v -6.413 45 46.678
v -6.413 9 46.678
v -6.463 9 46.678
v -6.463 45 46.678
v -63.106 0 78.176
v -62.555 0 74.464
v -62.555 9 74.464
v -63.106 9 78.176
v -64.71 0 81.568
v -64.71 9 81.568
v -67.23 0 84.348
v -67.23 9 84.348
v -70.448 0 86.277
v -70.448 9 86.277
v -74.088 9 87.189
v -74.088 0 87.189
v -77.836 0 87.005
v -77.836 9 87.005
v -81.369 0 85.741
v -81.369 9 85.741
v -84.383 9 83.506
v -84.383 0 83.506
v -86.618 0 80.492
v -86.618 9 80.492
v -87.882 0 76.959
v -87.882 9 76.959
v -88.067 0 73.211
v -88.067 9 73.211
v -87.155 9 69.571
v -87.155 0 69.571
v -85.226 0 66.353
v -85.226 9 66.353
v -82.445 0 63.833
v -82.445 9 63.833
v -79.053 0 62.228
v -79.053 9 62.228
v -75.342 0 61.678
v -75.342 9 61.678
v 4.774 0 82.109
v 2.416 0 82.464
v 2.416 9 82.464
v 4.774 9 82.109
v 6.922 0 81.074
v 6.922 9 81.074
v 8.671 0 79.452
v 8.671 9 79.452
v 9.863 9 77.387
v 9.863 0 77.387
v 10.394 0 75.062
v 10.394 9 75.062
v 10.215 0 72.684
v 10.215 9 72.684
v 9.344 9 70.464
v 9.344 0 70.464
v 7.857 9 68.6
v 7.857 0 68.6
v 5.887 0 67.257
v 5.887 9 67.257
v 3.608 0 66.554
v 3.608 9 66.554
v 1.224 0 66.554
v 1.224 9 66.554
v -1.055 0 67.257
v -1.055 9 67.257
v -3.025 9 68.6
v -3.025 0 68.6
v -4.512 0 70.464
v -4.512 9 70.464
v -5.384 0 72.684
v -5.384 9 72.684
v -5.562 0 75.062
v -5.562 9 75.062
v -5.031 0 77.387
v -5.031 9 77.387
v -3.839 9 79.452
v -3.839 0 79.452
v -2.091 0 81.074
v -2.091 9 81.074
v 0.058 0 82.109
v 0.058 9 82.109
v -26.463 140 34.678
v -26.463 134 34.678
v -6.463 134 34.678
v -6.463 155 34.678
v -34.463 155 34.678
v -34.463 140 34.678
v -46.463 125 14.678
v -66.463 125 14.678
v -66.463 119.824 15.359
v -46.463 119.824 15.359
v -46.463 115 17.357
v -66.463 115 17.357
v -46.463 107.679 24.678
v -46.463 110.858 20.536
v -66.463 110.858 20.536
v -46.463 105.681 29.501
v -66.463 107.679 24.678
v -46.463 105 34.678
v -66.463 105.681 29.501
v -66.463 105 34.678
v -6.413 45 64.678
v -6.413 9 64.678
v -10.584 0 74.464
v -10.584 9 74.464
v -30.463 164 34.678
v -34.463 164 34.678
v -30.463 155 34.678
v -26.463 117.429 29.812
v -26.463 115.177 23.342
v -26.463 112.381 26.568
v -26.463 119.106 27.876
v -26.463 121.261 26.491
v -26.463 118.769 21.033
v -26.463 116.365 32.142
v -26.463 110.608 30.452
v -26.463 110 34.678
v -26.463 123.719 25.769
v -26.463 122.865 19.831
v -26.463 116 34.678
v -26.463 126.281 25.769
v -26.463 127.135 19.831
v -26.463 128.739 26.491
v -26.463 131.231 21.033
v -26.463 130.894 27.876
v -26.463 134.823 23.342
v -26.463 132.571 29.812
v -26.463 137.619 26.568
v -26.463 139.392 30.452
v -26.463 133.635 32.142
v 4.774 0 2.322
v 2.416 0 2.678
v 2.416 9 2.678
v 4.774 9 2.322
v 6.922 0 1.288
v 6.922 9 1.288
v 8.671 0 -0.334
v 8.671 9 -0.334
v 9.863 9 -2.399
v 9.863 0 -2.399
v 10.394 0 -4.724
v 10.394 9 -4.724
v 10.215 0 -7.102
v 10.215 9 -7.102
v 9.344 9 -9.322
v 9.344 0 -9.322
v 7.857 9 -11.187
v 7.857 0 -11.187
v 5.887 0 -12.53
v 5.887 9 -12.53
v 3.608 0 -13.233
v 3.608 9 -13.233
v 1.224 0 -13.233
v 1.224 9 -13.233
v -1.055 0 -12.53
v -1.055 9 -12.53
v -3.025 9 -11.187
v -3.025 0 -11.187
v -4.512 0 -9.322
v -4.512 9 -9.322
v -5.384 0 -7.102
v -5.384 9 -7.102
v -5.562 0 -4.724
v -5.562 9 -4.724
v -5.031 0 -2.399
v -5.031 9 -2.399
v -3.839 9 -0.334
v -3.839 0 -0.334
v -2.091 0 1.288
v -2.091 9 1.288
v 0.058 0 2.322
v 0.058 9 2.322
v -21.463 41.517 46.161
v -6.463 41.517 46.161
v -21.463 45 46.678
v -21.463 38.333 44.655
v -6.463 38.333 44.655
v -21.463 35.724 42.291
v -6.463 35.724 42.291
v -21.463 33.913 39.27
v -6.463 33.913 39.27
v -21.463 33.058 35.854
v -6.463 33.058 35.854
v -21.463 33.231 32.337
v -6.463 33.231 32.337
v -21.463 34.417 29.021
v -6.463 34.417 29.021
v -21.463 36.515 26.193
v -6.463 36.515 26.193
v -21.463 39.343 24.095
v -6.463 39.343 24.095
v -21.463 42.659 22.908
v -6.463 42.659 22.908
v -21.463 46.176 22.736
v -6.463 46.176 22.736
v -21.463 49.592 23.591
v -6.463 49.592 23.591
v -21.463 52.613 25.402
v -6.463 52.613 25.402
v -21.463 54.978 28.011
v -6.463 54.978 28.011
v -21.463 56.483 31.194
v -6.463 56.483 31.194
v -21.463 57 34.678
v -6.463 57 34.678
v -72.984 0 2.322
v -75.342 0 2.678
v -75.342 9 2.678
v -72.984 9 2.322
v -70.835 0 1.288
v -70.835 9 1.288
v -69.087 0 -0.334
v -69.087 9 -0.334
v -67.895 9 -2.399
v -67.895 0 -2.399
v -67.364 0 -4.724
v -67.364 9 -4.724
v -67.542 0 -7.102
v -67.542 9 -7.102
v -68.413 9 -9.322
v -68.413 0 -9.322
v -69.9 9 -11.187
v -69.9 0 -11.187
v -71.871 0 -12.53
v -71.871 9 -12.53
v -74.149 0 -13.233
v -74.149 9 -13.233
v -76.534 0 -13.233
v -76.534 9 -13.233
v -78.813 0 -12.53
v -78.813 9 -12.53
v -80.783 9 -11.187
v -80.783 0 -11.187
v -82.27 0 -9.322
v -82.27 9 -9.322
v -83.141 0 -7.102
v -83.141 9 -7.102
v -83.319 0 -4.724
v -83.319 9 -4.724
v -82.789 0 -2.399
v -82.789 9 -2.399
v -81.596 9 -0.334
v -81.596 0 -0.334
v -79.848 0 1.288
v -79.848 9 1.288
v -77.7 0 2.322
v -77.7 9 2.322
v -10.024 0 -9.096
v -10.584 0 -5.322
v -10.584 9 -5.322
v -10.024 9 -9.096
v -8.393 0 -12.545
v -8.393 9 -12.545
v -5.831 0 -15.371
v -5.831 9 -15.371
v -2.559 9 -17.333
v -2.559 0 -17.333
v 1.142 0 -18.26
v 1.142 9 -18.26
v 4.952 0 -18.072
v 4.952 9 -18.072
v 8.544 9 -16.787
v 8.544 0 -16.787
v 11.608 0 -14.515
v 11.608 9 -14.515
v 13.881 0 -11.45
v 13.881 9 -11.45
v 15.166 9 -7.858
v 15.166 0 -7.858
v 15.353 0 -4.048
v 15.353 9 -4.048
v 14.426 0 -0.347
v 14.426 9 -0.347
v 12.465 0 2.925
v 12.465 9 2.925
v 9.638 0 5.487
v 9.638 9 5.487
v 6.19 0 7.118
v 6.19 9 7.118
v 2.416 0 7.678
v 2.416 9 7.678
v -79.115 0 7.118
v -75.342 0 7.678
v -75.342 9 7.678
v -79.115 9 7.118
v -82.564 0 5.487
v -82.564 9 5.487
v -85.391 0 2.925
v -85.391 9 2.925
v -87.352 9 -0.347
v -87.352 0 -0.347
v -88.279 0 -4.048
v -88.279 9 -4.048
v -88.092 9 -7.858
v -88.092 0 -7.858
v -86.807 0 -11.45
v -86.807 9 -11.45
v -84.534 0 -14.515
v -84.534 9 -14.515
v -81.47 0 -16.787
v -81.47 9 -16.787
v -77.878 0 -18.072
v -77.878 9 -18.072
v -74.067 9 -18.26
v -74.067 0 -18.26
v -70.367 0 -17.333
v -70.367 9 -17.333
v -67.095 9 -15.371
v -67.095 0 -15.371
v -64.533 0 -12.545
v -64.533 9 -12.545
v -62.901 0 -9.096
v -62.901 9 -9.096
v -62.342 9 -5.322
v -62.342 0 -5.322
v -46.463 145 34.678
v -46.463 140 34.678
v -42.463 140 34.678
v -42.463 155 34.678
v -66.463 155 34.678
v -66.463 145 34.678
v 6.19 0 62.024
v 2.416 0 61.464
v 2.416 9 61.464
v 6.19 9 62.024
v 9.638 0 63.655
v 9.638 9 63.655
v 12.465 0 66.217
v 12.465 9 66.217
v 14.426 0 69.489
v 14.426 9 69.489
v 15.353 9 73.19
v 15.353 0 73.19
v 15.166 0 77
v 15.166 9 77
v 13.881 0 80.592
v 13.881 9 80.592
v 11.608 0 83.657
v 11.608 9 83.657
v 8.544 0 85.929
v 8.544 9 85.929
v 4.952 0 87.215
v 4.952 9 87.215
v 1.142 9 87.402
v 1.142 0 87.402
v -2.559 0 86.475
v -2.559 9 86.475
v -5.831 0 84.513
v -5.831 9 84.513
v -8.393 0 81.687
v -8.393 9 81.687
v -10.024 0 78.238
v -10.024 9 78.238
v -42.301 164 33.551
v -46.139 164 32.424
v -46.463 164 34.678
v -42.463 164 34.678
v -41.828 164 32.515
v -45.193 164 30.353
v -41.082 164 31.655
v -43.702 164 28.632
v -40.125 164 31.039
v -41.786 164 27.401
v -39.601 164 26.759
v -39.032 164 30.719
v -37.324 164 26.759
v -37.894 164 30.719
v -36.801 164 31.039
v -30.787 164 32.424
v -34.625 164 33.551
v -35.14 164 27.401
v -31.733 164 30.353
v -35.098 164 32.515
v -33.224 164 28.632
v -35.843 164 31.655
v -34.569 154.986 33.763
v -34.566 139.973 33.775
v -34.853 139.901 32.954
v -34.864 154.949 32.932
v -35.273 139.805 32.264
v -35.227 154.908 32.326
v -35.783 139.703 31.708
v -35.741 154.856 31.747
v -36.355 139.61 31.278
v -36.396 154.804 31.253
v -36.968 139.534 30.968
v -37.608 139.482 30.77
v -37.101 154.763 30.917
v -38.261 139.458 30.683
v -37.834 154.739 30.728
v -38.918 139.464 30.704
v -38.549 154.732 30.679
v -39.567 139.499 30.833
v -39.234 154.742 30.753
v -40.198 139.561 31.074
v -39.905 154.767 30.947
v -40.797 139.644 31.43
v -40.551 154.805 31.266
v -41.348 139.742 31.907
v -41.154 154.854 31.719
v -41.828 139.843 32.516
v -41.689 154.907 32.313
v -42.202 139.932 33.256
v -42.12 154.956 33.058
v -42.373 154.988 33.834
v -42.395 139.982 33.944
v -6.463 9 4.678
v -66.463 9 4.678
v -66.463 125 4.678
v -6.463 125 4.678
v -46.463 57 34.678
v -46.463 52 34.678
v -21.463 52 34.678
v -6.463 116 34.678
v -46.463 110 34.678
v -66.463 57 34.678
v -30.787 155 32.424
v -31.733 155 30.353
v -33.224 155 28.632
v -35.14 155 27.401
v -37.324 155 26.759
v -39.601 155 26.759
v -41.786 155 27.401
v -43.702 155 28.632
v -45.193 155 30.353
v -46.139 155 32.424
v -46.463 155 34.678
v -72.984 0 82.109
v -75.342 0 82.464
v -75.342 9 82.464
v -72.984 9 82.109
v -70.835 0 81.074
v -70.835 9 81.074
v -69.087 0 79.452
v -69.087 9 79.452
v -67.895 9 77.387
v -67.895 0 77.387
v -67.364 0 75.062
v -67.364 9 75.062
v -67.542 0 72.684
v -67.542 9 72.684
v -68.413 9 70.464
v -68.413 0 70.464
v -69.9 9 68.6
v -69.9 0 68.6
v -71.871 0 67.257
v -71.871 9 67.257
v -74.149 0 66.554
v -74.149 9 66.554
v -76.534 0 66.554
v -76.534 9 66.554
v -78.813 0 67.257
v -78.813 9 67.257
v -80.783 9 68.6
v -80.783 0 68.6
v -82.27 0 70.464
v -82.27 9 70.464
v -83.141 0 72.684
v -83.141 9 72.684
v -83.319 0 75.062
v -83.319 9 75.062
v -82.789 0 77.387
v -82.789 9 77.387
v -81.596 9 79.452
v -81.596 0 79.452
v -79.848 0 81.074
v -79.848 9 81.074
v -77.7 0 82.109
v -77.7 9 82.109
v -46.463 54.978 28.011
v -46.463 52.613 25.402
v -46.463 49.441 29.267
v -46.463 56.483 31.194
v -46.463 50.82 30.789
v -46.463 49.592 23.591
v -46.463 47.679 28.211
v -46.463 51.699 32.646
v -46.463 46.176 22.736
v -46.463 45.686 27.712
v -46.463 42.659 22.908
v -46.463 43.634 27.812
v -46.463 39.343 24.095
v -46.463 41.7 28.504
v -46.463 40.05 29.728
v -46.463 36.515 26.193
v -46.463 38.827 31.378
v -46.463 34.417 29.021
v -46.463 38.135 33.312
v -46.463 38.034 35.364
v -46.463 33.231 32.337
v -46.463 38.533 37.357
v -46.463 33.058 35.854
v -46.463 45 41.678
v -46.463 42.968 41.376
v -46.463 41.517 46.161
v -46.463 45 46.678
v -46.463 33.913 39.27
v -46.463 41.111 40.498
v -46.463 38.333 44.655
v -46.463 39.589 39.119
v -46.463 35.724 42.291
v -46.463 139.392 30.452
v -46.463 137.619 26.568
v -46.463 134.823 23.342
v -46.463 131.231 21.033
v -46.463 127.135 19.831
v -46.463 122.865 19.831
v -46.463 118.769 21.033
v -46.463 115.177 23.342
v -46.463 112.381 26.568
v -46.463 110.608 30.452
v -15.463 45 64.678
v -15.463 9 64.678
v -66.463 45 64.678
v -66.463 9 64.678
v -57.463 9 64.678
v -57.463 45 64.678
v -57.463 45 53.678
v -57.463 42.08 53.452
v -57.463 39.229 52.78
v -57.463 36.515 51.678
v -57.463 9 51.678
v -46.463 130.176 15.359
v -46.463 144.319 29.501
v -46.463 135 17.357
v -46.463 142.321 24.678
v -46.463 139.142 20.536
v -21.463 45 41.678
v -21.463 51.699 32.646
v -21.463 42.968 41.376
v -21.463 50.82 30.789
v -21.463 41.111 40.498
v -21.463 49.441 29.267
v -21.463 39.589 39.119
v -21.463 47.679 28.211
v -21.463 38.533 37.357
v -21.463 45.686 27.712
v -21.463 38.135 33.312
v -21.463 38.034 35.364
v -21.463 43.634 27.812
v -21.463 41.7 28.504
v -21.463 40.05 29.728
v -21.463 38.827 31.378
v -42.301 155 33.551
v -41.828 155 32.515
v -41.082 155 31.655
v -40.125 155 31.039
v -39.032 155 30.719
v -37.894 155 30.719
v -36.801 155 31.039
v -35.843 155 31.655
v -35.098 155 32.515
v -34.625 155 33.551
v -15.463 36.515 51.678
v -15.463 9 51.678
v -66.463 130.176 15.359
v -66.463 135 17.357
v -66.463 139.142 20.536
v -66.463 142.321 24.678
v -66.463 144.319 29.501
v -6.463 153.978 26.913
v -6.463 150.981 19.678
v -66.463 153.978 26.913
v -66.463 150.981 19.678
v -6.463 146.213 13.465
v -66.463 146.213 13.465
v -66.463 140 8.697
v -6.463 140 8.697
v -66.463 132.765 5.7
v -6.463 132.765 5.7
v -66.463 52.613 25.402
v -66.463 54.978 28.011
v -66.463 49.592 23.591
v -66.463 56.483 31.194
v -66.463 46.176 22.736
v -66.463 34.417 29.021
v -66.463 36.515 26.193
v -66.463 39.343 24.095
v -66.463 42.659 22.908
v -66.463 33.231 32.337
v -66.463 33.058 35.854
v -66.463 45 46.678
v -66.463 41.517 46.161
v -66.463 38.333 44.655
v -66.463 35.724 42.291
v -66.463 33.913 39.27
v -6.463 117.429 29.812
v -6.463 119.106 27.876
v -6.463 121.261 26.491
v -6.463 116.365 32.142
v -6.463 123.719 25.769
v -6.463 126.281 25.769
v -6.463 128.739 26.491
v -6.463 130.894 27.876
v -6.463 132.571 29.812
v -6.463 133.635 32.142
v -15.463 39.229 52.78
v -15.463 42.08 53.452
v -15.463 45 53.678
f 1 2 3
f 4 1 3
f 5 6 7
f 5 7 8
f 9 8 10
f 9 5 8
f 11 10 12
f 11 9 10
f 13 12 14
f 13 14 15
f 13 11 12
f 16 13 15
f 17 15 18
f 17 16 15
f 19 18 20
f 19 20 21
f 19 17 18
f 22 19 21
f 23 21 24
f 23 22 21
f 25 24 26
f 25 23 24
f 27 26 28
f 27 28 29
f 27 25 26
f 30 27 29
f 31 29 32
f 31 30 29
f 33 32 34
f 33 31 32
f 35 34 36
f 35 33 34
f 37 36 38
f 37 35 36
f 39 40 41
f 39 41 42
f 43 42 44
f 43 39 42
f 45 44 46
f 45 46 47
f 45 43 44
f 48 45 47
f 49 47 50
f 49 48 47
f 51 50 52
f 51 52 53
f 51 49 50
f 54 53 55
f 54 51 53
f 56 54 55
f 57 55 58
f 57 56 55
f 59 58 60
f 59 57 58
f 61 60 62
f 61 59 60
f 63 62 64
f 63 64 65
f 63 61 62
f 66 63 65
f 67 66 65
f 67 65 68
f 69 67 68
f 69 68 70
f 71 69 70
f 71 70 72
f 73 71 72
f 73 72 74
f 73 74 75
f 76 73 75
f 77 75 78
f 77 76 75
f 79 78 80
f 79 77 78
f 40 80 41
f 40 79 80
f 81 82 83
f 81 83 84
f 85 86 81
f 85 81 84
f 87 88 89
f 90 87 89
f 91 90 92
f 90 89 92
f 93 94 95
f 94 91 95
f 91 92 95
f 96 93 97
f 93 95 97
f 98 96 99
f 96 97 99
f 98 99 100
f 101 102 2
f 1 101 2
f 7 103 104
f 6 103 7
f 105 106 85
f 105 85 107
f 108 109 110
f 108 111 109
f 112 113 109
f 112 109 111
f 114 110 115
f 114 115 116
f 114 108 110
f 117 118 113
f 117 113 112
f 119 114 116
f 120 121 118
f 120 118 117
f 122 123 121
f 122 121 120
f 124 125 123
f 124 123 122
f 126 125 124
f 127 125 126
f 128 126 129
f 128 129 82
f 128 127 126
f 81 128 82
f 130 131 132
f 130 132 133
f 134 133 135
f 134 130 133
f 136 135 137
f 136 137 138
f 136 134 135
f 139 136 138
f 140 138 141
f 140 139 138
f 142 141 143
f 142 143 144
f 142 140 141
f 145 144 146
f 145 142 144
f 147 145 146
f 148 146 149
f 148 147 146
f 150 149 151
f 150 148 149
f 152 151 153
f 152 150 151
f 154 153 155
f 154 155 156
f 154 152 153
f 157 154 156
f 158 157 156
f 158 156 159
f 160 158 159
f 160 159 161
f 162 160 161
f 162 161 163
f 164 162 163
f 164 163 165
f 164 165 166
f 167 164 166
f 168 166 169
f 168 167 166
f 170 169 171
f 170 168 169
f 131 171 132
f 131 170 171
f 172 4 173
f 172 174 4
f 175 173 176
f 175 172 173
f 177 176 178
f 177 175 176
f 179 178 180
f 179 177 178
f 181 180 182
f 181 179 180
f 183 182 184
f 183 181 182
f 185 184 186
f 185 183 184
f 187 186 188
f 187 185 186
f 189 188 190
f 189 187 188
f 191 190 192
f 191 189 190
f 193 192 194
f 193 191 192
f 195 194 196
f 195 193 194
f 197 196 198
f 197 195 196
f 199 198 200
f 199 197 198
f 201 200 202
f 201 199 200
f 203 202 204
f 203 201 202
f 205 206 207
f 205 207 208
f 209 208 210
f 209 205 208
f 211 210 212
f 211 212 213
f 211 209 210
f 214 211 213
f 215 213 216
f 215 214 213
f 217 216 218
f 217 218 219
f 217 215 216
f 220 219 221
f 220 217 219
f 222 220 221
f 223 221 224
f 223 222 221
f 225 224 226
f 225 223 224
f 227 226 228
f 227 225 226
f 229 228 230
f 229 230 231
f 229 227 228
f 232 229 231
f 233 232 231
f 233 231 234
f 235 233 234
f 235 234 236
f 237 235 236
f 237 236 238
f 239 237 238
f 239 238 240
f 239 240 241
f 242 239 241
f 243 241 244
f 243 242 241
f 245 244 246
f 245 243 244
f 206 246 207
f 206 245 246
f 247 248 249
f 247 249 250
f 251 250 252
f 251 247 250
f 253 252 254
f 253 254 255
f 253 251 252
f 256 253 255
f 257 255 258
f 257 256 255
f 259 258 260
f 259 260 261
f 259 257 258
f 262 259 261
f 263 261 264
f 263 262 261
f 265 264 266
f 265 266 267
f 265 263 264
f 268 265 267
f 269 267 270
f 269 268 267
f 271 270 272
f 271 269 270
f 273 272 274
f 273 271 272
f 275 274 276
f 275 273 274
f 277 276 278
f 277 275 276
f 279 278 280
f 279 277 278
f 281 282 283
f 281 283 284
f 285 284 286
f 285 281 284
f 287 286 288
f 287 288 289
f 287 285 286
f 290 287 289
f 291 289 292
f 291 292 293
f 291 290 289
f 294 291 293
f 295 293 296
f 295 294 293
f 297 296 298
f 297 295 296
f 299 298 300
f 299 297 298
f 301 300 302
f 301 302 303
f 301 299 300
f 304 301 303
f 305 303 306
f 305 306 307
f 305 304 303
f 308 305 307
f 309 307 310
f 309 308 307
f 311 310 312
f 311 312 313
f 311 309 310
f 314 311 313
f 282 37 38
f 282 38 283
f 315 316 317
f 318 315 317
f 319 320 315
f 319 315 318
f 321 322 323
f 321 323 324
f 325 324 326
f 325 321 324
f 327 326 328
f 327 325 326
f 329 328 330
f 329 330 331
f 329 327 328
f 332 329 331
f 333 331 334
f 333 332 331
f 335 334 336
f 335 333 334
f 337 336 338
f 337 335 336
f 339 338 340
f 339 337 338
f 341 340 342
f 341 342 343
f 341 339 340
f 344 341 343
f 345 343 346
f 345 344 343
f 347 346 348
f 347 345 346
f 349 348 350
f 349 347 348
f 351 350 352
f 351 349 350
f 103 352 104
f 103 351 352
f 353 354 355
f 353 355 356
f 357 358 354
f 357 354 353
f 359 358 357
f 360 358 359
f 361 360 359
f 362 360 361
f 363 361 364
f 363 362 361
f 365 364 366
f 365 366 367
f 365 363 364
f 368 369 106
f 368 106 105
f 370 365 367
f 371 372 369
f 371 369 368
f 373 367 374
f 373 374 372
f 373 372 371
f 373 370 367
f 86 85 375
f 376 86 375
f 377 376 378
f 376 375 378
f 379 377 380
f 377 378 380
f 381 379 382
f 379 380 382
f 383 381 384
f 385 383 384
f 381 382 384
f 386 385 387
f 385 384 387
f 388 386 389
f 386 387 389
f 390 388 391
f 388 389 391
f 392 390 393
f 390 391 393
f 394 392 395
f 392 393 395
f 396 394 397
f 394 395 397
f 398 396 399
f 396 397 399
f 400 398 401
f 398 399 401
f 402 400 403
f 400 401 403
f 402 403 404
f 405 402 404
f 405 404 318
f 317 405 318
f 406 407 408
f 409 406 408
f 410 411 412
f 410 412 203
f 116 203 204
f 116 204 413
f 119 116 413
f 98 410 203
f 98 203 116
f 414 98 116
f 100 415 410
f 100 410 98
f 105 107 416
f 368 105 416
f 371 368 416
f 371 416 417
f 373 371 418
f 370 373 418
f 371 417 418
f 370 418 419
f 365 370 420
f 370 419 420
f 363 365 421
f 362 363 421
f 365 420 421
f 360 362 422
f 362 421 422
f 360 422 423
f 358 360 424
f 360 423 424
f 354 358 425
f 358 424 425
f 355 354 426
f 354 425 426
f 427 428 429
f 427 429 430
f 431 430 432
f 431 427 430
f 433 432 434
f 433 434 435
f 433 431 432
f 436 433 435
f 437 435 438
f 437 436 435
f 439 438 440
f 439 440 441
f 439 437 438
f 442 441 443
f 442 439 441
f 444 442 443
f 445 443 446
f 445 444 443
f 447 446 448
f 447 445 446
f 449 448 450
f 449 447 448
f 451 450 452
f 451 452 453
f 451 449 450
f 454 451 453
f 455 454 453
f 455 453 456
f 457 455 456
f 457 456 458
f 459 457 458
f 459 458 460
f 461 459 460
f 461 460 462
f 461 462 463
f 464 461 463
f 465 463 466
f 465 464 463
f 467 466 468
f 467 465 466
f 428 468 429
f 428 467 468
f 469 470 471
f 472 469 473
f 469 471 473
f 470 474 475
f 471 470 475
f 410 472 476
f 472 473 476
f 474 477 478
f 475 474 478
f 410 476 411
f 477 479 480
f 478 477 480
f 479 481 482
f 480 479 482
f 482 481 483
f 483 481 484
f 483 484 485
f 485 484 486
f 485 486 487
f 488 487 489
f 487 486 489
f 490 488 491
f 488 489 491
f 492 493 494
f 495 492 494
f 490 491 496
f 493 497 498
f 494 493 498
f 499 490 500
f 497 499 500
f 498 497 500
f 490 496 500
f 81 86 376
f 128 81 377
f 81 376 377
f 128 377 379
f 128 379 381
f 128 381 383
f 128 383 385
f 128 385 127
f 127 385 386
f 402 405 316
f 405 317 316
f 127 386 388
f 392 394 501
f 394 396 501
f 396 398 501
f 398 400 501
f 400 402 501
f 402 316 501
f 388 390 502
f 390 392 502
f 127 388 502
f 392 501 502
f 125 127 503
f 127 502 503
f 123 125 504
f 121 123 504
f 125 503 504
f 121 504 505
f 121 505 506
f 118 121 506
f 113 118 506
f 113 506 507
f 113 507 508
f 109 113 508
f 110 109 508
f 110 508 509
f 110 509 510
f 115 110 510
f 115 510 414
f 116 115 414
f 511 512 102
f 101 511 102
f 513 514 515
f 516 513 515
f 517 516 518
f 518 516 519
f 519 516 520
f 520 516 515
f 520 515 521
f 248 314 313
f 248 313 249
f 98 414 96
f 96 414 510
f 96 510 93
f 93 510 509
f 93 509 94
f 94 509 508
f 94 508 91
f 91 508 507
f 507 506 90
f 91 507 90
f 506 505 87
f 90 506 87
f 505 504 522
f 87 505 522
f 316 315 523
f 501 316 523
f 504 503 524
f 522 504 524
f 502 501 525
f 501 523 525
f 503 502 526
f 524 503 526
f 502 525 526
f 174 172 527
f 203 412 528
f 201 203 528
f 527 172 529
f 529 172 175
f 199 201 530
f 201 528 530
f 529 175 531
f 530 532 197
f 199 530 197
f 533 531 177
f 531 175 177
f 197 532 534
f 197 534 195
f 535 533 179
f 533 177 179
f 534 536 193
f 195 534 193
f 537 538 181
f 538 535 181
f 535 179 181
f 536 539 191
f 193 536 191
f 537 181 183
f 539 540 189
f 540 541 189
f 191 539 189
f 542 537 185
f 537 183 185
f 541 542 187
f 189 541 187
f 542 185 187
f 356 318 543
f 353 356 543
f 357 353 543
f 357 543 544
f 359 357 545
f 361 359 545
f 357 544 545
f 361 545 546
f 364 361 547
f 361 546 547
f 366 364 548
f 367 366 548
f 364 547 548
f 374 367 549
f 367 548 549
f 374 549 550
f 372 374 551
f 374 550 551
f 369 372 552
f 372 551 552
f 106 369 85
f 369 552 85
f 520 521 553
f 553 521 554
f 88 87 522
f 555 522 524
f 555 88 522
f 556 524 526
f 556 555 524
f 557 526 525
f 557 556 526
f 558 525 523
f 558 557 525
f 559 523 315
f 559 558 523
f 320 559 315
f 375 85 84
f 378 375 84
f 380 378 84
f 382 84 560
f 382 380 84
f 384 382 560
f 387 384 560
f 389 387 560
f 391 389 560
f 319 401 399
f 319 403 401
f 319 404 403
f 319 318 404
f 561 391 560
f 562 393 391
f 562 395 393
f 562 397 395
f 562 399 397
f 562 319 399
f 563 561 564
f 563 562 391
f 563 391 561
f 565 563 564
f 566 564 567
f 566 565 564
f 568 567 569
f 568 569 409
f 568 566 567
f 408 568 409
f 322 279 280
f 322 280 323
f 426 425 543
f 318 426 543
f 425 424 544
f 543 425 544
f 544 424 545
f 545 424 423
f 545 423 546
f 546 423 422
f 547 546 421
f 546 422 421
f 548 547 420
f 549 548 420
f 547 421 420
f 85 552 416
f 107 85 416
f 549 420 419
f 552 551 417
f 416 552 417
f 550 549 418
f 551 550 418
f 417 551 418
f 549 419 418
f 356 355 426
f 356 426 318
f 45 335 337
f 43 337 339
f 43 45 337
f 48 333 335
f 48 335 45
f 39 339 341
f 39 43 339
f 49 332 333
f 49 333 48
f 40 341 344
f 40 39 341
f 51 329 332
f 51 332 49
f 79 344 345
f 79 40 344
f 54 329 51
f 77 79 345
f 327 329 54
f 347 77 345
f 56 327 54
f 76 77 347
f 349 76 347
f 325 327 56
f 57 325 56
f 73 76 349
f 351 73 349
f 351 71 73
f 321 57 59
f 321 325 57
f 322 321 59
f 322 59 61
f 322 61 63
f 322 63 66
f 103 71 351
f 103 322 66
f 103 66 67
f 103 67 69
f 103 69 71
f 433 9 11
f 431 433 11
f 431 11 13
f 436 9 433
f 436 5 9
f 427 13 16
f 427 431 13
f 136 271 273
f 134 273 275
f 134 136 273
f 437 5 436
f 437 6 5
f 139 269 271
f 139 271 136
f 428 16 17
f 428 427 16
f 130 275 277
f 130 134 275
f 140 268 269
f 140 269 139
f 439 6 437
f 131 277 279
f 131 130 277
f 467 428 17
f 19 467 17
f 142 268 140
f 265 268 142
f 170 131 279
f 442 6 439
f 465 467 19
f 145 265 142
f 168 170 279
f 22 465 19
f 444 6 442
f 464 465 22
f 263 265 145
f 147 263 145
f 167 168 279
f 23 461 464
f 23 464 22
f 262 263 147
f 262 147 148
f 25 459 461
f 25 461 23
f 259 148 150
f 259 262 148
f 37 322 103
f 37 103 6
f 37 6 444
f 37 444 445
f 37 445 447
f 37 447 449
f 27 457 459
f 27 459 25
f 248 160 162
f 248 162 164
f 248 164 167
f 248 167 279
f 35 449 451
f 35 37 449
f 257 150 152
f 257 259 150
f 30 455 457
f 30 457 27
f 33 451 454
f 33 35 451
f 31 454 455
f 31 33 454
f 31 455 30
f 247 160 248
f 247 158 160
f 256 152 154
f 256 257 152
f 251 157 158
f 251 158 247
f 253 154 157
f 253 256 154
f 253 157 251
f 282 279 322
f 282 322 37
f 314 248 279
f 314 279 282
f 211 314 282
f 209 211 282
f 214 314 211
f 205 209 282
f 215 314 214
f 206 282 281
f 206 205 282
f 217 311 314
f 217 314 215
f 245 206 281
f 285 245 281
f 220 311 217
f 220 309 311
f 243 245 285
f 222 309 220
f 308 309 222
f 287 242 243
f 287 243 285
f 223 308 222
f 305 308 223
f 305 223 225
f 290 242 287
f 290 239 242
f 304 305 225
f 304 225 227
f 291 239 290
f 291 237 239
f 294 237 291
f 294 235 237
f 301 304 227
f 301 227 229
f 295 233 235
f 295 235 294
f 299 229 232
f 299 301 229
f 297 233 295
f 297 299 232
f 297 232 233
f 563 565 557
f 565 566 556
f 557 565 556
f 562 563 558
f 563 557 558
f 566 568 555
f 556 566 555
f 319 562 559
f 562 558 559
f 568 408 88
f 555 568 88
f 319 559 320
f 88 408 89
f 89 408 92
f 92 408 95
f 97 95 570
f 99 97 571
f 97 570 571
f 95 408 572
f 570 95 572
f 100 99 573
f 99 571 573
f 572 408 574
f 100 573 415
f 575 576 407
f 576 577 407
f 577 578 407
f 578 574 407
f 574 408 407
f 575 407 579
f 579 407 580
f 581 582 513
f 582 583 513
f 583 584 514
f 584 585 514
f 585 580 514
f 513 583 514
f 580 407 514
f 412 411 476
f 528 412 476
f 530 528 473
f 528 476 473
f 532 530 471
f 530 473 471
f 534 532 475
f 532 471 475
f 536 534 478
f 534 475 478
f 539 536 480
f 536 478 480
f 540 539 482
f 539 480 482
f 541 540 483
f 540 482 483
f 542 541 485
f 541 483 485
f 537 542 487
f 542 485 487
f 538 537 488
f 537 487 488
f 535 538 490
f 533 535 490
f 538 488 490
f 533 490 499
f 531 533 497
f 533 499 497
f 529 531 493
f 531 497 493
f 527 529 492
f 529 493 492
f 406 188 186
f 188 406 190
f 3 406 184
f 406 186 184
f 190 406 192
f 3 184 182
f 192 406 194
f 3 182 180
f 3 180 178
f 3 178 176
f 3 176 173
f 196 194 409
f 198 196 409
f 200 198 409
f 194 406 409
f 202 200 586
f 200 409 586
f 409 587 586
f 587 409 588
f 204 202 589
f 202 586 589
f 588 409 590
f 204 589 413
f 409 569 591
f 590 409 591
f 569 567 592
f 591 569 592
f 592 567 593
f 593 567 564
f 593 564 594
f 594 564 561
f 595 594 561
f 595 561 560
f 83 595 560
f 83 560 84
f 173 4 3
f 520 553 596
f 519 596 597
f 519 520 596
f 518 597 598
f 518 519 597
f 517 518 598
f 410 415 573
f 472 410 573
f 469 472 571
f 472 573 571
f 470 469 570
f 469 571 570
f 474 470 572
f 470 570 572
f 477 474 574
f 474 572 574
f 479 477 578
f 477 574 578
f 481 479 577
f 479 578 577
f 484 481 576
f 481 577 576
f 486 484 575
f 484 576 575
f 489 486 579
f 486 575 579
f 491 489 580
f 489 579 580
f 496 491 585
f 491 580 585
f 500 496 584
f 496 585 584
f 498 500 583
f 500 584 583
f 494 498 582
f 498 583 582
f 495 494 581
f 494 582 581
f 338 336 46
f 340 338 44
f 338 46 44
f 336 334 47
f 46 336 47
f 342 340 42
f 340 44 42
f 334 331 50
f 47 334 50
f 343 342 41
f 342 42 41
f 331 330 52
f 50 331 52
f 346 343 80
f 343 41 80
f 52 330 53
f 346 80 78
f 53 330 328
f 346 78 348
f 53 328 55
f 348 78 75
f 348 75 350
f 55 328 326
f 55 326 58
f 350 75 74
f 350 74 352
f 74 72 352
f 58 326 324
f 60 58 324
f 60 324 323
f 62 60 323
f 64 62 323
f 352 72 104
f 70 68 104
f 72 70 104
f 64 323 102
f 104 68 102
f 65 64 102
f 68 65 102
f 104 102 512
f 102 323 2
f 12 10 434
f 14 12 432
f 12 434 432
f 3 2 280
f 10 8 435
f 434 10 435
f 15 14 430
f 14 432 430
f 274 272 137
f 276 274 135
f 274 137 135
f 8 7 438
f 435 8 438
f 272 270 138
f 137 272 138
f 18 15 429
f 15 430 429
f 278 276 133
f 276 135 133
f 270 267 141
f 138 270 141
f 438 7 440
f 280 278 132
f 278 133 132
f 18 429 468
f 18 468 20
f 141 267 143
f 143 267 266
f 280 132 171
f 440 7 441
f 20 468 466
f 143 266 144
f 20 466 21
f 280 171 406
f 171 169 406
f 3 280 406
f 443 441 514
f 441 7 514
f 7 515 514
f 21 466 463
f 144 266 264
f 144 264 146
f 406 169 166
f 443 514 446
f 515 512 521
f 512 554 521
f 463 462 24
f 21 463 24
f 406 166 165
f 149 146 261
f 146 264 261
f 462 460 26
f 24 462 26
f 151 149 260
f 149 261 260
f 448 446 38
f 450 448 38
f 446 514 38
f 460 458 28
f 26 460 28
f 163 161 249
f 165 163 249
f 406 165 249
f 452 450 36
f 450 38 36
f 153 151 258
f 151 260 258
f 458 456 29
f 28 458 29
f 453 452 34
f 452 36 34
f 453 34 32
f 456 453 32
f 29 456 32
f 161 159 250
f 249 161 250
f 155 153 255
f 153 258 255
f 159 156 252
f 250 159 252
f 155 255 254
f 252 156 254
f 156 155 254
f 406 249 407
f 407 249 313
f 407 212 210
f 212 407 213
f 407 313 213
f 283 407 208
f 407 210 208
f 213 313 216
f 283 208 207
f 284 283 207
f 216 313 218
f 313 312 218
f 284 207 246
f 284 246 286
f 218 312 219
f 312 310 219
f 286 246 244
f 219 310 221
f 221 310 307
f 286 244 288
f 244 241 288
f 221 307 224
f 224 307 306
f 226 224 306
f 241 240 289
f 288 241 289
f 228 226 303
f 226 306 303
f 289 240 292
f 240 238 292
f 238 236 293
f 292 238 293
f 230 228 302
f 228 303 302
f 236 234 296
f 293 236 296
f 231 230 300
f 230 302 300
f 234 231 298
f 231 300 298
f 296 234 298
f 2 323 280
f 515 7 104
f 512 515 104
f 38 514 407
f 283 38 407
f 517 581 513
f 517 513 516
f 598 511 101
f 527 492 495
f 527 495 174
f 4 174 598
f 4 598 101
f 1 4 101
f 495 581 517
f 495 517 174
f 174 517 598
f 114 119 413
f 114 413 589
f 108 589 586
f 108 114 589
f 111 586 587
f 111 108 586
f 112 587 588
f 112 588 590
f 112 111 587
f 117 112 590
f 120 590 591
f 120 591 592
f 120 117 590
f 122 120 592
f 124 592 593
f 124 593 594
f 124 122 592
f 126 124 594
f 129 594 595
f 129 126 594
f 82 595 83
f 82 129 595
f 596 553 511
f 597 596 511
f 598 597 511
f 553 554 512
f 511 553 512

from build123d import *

# Parameters (mm, degrees)
SKETCH1_R            = 8
BOSS_EXTRUDE1_DEPTH  = 9
BOSS_EXTRUDE2_DEPTH  = 36
SKETCH3_W            = 30
SKETCH3_H            = 80
BOSS_EXTRUDE3_DEPTH  = 60
SKETCH4_R            = 12
CUT_EXTRUDE2_DEPTH   = 20
SKETCH5_R            = 7
CUT_EXTRUDE3_DEPTH   = 25
CUT_EXTRUDE4_START   = -15
SKETCH6_R            = 12
CUT_EXTRUDE4_DEPTH   = 15
BOSS_EXTRUDE4_DEPTH  = 36
BOSS_EXTRUDE5_DEPTH  = 60
SKETCH10_R           = 20
CUT_EXTRUDE5_DEPTH   = 60
BOSS_EXTRUDE7_DEPTH  = 60
BOSS_EXTRUDE8_DEPTH  = 40
BOSS_EXTRUDE9_DEPTH  = 20
BOSS_EXTRUDE10_DEPTH = 9
SKETCH20_R           = 4
CUT_EXTRUDE6_DEPTH   = 18


with BuildPart() as part:
    # Sketch1 → Boss-Extrude1 (new body)
    with BuildSketch(Plane(origin=(0, 0, 0), x_dir=(1, 0, 0), z_dir=(0, 1, 0))):
        with BuildLine():
            Line((-62.341648488, 5.322137989), (-10.584107064, 5.322137989))
            ThreePointArc((-10.584107064, 5.322137989), (11.608281092, 14.514526145), (2.415892936, -7.677862011))
            Line((2.415892936, -7.677862011), (2.415892936, -61.464316376))
            ThreePointArc((2.415892936, -61.464316376), (11.608281092, -83.656704531), (-10.584107064, -74.464316376))
            Line((-10.584107064, -74.464316376), (-62.555194123, -74.464316376))
            ThreePointArc((-62.555194123, -74.464316376), (-84.383037077, -83.505704964), (-75.341648488, -61.677862011))
            Line((-75.341648488, -61.677862011), (-75.341648488, -7.677862011))
            ThreePointArc((-75.341648488, -7.677862011), (-84.534036644, 14.514526145), (-62.341648488, 5.322137989))
        make_face()
        with Locations(Location((2.415892936, 5.322137989, 0), (0, 0, 270))):
            Circle(SKETCH1_R, mode=Mode.SUBTRACT)
        with Locations(Location((-75.341648488, 5.322137989, 0), (0, 0, 270))):
            Circle(SKETCH1_R, mode=Mode.SUBTRACT)
        with Locations(Location((-75.341648488, -74.464316376, 0), (0, 0, 270))):
            Circle(SKETCH1_R, mode=Mode.SUBTRACT)
        with Locations(Location((2.415892936, -74.464316376, 0), (0, 0, 270))):
            Circle(SKETCH1_R, mode=Mode.SUBTRACT)
    extrude(amount=BOSS_EXTRUDE1_DEPTH)

    # Sketch2 → Boss-Extrude2 (add)
    with BuildSketch(Plane(origin=(0, 9, 0), x_dir=(1, 0, 0), z_dir=(0, 1, 0))):
        Polygon((-66.462877776, -4.677862011), (-66.462877776, -46.677862011), (-46.462877776, -46.677862011), (-46.462877776, -41.677862011), (-21.462877776, -41.677862011), (-21.462877776, -46.677862011), (-6.462877776, -46.677862011), (-6.462877776, -4.677862011), align=None)
    extrude(amount=BOSS_EXTRUDE2_DEPTH)

    # Sketch3 → Boss-Extrude3 (add)
    with BuildSketch(Plane.ZY.offset(66.462877776)):
        with Locations((19.677862011, 85)):
            Rectangle(SKETCH3_W, SKETCH3_H)
    extrude(amount=-BOSS_EXTRUDE3_DEPTH)

    # Sketch4 → Cut-Extrude2 (cut)
    with BuildSketch(Plane.ZY.offset(66.462877776)):
        with Locations((34.677862011, 45)):
            Circle(SKETCH4_R)
    extrude(amount=-CUT_EXTRUDE2_DEPTH, mode=Mode.SUBTRACT)

    # Sketch5 → Cut-Extrude3 (cut)
    with BuildSketch(Plane.ZY.offset(46.462877776)):
        with Locations((34.677862011, 45)):
            Circle(SKETCH5_R)
    extrude(amount=-CUT_EXTRUDE3_DEPTH, mode=Mode.SUBTRACT)

    # Sketch6 → Cut-Extrude4 (cut)
    with BuildSketch(Plane(origin=(-6.462877776, 0, 0), x_dir=(0, 0, -1), z_dir=(1, 0, 0)).offset(CUT_EXTRUDE4_START)):
        with Locations((-34.677862011, 45)):
            Circle(SKETCH6_R)
    extrude(amount=CUT_EXTRUDE4_DEPTH, mode=Mode.SUBTRACT)

    # Sketch7 → Boss-Extrude4 (add)
    with BuildSketch(Plane(origin=(0, 9, 0), x_dir=(1, 0, 0), z_dir=(0, 1, 0))):
        Polygon((-66.462877776, -46.677862011), (-66.462877776, -64.677862011), (-57.462877776, -64.677862011), (-57.462877776, -51.677862011), (-15.462877776, -51.677862011), (-15.462877776, -64.677862011), (-6.412975689, -64.677862011), (-6.412975689, -46.677862011), (-21.462877776, -46.677862011), (-21.462877776, -41.677862011), (-46.462877776, -41.677862011), (-46.462877776, -46.677862011), align=None)
    extrude(amount=BOSS_EXTRUDE4_DEPTH)

    # Sketch9 → Boss-Extrude5 (add)
    with BuildSketch(Plane.ZY.offset(66.462877776)):
        with BuildLine():
            Line((53.677862011, 45), (46.677862011, 45))
            ThreePointArc((46.677862011, 45), (34.677862011, 33), (22.677862011, 45))
            Line((22.677862011, 45), (15.677862011, 45))
            ThreePointArc((15.677862011, 45), (34.677862011, 26), (53.677862011, 45))
        make_face()
    extrude(amount=-BOSS_EXTRUDE5_DEPTH)

    # Sketch10 → Cut-Extrude5 (cut)
    with BuildSketch(Plane.ZY.offset(66.462877776)):
        with Locations((34.677862011, 125)):
            Circle(SKETCH10_R)
    extrude(amount=-CUT_EXTRUDE5_DEPTH, mode=Mode.SUBTRACT)

    # Sketch11 → Boss-Extrude7 (add)
    with BuildSketch(Plane.ZY.offset(66.462877776)):
        with BuildLine():
            Line((34.677862011, 95), (34.677862011, 105))
            ThreePointArc((34.677862011, 105), (14.677862011, 125), (34.677862011, 145))
            Line((34.677862011, 145), (34.677862011, 155))
            ThreePointArc((34.677862011, 155), (4.677862011, 125), (34.677862011, 95))
        make_face()
    extrude(amount=-BOSS_EXTRUDE7_DEPTH)

    # Sketch17 → Boss-Extrude8 (add)
    with BuildSketch(Plane.ZY.offset(46.462877776)):
        with BuildLine():
            Line((34.677862011, 145), (34.677862011, 140))
            ThreePointArc((34.677862011, 140), (19.677862011, 125), (34.677862011, 110))
            Line((34.677862011, 110), (34.677862011, 105))
            ThreePointArc((34.677862011, 105), (14.677862011, 125), (34.677862011, 145))
        make_face()
    extrude(amount=-BOSS_EXTRUDE8_DEPTH)

    # Sketch18 → Boss-Extrude9 (add)
    with BuildSketch(Plane.ZY.offset(26.462877776)):
        with BuildLine():
            Line((34.677862011, 134), (34.677862011, 140))
            ThreePointArc((34.677862011, 140), (19.677862011, 125), (34.677862011, 110))
            Line((34.677862011, 110), (34.677862011, 116))
            ThreePointArc((34.677862011, 116), (25.677862011, 125), (34.677862011, 134))
        make_face()
    extrude(amount=-BOSS_EXTRUDE9_DEPTH)

    # Sketch20 → Cut-Extrude6 (cut)
    with BuildSketch(Plane(origin=(0, 155, 0), x_dir=(1, 0, 0), z_dir=(0, 1, 0))):
        with Locations((-38.462877776, -34.677862011)):
            Circle(SKETCH20_R)
    extrude(amount=-CUT_EXTRUDE6_DEPTH, mode=Mode.SUBTRACT)


with BuildPart() as body_2:
    # Sketch19 → Boss-Extrude10 (new body)
    with BuildSketch(Plane(origin=(0, 155, 0), x_dir=(1, 0, 0), z_dir=(0, 1, 0))):
        with BuildLine():
            ThreePointArc((-30.462877776, -34.677862011), (-38.462877776, -26.677862011), (-46.462877776, -34.677862011))
            Line((-46.462877776, -34.677862011), (-42.462877776, -34.677862011))
            ThreePointArc((-42.462877776, -34.677862011), (-38.462877776, -30.677862011), (-34.462877776, -34.677862011))
            Line((-34.462877776, -34.677862011), (-30.462877776, -34.677862011))
        make_face()
    extrude(amount=BOSS_EXTRUDE10_DEPTH)


solid = Compound([part.part, body_2.part])
